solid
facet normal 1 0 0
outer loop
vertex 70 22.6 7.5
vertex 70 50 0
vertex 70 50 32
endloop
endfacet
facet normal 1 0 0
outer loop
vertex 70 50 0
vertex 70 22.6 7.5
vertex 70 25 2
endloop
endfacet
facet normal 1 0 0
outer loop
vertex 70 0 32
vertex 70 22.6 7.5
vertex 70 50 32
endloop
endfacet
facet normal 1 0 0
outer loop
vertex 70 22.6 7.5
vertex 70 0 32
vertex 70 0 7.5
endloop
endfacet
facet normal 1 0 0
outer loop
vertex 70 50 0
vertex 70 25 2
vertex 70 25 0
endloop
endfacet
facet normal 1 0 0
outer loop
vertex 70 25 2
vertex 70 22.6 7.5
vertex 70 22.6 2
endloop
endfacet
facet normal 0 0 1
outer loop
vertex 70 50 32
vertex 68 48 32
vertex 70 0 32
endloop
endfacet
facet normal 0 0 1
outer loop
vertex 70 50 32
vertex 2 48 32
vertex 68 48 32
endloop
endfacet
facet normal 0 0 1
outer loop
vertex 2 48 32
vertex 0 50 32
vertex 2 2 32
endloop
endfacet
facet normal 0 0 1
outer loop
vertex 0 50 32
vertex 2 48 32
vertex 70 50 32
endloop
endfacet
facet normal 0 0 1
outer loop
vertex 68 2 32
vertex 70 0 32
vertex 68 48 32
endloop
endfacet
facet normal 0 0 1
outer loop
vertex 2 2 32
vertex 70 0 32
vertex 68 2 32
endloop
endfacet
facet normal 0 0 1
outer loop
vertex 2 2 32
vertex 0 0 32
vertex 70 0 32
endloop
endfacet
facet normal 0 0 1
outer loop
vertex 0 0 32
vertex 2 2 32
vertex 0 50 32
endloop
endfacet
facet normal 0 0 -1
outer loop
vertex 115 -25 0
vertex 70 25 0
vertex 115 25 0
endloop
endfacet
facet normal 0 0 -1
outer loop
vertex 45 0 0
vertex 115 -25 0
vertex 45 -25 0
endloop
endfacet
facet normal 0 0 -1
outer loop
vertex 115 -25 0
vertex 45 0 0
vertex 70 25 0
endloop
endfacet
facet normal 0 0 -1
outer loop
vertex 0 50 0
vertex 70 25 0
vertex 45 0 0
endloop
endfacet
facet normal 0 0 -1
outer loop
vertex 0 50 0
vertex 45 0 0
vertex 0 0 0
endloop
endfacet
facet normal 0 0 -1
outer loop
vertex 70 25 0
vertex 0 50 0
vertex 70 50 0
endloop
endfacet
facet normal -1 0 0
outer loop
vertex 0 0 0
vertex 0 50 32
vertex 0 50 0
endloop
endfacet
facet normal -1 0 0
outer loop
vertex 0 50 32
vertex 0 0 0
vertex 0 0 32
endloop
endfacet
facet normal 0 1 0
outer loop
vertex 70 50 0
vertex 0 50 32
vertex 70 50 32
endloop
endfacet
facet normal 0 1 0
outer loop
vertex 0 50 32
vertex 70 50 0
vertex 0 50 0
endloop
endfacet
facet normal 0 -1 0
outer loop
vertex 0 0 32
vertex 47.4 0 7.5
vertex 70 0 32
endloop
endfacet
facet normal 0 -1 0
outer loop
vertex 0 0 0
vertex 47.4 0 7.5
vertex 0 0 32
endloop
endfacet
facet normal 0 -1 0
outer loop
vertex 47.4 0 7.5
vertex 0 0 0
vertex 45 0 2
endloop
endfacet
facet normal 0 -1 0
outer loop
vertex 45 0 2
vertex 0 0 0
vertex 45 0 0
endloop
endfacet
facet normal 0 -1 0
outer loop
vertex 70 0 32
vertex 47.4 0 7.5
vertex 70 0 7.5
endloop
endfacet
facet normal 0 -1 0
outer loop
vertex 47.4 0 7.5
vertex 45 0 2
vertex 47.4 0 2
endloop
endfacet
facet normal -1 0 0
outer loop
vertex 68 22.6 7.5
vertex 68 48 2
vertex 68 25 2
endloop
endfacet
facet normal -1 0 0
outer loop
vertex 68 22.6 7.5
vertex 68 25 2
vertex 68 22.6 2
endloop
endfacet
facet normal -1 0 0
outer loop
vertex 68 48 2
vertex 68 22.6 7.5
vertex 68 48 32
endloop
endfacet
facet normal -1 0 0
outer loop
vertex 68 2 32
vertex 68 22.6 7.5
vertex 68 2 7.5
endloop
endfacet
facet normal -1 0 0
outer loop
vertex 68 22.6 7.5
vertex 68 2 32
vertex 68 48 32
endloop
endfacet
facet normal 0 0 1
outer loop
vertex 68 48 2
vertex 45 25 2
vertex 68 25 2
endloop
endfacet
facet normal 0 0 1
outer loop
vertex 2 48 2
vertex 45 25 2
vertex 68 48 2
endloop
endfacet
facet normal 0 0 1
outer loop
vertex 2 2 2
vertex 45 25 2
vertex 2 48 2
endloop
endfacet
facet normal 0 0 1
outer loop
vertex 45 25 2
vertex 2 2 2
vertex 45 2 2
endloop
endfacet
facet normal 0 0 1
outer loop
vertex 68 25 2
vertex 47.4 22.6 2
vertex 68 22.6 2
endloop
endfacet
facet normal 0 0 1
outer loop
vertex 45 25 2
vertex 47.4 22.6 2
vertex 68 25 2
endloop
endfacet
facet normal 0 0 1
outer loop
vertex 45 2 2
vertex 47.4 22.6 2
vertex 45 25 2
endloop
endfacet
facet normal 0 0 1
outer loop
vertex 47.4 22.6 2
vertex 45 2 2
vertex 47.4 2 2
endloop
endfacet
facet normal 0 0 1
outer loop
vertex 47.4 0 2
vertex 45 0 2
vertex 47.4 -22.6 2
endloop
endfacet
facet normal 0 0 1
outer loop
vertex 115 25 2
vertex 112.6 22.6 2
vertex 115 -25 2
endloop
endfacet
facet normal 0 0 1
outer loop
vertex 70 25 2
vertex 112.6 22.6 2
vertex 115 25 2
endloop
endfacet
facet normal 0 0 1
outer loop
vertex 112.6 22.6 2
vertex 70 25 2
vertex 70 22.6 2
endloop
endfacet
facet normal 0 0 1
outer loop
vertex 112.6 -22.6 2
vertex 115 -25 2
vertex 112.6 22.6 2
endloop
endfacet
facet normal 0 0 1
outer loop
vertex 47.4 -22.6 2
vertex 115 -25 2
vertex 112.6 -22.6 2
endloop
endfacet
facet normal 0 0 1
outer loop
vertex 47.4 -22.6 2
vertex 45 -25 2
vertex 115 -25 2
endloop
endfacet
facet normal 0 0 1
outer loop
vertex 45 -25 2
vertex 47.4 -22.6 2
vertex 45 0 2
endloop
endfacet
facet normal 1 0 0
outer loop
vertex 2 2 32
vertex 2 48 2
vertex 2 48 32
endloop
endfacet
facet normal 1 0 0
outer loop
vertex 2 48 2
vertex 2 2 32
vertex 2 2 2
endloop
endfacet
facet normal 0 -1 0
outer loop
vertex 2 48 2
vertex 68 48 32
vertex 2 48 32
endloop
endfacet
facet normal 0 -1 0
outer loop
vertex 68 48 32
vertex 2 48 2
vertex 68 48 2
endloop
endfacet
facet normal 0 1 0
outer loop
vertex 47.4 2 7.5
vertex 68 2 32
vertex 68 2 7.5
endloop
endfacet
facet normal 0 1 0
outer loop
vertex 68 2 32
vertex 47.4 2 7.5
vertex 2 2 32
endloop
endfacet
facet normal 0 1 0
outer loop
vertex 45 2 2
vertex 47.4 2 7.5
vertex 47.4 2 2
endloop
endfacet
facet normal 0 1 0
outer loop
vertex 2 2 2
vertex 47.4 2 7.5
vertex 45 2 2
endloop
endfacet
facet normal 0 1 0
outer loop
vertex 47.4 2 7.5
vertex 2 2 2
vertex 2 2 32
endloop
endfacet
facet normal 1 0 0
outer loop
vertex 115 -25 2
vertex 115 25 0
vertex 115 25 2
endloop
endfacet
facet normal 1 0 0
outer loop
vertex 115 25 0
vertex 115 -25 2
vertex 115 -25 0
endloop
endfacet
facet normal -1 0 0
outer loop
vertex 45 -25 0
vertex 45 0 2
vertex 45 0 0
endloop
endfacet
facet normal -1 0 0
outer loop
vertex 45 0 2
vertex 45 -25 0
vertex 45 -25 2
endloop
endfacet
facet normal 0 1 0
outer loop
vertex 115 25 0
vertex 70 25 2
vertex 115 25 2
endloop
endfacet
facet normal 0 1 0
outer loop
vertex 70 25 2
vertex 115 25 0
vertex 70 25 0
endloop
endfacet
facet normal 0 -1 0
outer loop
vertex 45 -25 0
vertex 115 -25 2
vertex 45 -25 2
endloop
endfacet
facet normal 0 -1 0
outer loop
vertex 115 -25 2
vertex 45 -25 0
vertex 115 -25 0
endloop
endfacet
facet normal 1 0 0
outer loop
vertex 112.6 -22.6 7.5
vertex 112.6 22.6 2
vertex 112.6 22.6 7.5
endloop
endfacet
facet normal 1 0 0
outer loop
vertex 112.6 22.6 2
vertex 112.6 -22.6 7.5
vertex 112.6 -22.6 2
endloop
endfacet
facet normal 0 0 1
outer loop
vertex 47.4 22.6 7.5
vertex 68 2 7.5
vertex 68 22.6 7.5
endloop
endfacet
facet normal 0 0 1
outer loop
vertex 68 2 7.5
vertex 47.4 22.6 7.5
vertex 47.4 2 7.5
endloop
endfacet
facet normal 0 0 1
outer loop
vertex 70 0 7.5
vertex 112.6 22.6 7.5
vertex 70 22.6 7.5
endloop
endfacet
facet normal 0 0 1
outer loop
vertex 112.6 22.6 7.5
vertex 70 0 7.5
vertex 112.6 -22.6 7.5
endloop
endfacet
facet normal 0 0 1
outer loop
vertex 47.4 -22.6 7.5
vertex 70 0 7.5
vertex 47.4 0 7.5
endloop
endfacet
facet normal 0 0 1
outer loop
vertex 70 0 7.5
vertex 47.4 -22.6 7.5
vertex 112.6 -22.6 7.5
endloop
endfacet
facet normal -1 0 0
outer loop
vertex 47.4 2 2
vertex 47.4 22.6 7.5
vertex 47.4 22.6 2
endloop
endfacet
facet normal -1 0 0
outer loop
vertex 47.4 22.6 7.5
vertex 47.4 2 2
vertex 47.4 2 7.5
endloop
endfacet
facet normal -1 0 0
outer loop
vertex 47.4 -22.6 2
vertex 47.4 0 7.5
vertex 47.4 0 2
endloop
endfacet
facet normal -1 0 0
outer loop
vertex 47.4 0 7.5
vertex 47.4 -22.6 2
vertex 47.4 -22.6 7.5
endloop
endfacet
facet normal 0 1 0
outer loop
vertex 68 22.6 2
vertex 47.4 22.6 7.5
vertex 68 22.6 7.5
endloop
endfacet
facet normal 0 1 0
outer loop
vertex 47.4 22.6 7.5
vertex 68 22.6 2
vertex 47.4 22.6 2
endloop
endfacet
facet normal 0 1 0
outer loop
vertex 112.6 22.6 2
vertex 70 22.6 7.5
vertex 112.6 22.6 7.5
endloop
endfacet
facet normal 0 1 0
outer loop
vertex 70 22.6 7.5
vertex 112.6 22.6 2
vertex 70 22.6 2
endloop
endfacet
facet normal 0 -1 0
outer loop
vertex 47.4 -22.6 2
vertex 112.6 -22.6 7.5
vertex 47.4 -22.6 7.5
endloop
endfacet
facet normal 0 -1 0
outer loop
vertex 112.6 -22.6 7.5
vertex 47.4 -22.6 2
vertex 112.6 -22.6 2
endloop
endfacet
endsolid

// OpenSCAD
// Two-part enclosure for small electronics board
// Print orientation: both parts on the bed, z = 0 up, 10 mm gap between them

// ---------- Parameters ----------
box_x      = 70;    // box outer length (X)
box_y      = 50;    // box outer width (Y)
box_z      = 30;    // box height (Z)
box_wall   = 2;     // box wall thickness
box_floor  = 2;     // box floor thickness

lid_t      = 2;     // lid plate thickness
lip_t      = 1.5;   // lip wall thickness
lip_h      = 4;     // lip height
lip_x      = 65.6;  // lip outer length (X)
lip_y      = 45.6;  // lip outer width (Y)
lip_clear  = 0.2;   // clearance between lip and box opening (each side)

gap        = 10;    // gap between box and lid prints
eps        = 0.5;   // cutter overshoot past faces

$fn = 64;

// ---------- Derived ----------
lip_x2 = lip_x - 2 * lip_clear;   // lip inner length (X), matches box opening
lip_y2 = lip_y - 2 * lip_clear;   // lip inner width (Y), matches box opening

// ---------- Modules ----------
module box() {
    difference() {
        cube([box_x, box_y, box_z + box_floor]);
        translate([box_wall, box_wall, box_floor])
            cube([box_x - 2 * box_wall,
                   box_y - 2 * box_wall,
                   box_z + 1]);     // open top, cutter past the top face
    }
}

module lid() {
    union() {
        // Plate, printed upside down, resting on the bed
        translate([-box_x / 2, -box_y / 2, 0])
            cube([box_x, box_y, lid_t]);

        // Lip on top of the plate, centred on it
        translate([-lip_x2 / 2, -lip_y2 / 2, lid_t])
            cube([lip_x2, lip_y2, lip_h + lip_t]);
    }
}

// ---------- Layout ----------
union() {
    translate([0, 0, 0])
        box();

    translate([box_x + gap, 0, 0])
        lid();
}
